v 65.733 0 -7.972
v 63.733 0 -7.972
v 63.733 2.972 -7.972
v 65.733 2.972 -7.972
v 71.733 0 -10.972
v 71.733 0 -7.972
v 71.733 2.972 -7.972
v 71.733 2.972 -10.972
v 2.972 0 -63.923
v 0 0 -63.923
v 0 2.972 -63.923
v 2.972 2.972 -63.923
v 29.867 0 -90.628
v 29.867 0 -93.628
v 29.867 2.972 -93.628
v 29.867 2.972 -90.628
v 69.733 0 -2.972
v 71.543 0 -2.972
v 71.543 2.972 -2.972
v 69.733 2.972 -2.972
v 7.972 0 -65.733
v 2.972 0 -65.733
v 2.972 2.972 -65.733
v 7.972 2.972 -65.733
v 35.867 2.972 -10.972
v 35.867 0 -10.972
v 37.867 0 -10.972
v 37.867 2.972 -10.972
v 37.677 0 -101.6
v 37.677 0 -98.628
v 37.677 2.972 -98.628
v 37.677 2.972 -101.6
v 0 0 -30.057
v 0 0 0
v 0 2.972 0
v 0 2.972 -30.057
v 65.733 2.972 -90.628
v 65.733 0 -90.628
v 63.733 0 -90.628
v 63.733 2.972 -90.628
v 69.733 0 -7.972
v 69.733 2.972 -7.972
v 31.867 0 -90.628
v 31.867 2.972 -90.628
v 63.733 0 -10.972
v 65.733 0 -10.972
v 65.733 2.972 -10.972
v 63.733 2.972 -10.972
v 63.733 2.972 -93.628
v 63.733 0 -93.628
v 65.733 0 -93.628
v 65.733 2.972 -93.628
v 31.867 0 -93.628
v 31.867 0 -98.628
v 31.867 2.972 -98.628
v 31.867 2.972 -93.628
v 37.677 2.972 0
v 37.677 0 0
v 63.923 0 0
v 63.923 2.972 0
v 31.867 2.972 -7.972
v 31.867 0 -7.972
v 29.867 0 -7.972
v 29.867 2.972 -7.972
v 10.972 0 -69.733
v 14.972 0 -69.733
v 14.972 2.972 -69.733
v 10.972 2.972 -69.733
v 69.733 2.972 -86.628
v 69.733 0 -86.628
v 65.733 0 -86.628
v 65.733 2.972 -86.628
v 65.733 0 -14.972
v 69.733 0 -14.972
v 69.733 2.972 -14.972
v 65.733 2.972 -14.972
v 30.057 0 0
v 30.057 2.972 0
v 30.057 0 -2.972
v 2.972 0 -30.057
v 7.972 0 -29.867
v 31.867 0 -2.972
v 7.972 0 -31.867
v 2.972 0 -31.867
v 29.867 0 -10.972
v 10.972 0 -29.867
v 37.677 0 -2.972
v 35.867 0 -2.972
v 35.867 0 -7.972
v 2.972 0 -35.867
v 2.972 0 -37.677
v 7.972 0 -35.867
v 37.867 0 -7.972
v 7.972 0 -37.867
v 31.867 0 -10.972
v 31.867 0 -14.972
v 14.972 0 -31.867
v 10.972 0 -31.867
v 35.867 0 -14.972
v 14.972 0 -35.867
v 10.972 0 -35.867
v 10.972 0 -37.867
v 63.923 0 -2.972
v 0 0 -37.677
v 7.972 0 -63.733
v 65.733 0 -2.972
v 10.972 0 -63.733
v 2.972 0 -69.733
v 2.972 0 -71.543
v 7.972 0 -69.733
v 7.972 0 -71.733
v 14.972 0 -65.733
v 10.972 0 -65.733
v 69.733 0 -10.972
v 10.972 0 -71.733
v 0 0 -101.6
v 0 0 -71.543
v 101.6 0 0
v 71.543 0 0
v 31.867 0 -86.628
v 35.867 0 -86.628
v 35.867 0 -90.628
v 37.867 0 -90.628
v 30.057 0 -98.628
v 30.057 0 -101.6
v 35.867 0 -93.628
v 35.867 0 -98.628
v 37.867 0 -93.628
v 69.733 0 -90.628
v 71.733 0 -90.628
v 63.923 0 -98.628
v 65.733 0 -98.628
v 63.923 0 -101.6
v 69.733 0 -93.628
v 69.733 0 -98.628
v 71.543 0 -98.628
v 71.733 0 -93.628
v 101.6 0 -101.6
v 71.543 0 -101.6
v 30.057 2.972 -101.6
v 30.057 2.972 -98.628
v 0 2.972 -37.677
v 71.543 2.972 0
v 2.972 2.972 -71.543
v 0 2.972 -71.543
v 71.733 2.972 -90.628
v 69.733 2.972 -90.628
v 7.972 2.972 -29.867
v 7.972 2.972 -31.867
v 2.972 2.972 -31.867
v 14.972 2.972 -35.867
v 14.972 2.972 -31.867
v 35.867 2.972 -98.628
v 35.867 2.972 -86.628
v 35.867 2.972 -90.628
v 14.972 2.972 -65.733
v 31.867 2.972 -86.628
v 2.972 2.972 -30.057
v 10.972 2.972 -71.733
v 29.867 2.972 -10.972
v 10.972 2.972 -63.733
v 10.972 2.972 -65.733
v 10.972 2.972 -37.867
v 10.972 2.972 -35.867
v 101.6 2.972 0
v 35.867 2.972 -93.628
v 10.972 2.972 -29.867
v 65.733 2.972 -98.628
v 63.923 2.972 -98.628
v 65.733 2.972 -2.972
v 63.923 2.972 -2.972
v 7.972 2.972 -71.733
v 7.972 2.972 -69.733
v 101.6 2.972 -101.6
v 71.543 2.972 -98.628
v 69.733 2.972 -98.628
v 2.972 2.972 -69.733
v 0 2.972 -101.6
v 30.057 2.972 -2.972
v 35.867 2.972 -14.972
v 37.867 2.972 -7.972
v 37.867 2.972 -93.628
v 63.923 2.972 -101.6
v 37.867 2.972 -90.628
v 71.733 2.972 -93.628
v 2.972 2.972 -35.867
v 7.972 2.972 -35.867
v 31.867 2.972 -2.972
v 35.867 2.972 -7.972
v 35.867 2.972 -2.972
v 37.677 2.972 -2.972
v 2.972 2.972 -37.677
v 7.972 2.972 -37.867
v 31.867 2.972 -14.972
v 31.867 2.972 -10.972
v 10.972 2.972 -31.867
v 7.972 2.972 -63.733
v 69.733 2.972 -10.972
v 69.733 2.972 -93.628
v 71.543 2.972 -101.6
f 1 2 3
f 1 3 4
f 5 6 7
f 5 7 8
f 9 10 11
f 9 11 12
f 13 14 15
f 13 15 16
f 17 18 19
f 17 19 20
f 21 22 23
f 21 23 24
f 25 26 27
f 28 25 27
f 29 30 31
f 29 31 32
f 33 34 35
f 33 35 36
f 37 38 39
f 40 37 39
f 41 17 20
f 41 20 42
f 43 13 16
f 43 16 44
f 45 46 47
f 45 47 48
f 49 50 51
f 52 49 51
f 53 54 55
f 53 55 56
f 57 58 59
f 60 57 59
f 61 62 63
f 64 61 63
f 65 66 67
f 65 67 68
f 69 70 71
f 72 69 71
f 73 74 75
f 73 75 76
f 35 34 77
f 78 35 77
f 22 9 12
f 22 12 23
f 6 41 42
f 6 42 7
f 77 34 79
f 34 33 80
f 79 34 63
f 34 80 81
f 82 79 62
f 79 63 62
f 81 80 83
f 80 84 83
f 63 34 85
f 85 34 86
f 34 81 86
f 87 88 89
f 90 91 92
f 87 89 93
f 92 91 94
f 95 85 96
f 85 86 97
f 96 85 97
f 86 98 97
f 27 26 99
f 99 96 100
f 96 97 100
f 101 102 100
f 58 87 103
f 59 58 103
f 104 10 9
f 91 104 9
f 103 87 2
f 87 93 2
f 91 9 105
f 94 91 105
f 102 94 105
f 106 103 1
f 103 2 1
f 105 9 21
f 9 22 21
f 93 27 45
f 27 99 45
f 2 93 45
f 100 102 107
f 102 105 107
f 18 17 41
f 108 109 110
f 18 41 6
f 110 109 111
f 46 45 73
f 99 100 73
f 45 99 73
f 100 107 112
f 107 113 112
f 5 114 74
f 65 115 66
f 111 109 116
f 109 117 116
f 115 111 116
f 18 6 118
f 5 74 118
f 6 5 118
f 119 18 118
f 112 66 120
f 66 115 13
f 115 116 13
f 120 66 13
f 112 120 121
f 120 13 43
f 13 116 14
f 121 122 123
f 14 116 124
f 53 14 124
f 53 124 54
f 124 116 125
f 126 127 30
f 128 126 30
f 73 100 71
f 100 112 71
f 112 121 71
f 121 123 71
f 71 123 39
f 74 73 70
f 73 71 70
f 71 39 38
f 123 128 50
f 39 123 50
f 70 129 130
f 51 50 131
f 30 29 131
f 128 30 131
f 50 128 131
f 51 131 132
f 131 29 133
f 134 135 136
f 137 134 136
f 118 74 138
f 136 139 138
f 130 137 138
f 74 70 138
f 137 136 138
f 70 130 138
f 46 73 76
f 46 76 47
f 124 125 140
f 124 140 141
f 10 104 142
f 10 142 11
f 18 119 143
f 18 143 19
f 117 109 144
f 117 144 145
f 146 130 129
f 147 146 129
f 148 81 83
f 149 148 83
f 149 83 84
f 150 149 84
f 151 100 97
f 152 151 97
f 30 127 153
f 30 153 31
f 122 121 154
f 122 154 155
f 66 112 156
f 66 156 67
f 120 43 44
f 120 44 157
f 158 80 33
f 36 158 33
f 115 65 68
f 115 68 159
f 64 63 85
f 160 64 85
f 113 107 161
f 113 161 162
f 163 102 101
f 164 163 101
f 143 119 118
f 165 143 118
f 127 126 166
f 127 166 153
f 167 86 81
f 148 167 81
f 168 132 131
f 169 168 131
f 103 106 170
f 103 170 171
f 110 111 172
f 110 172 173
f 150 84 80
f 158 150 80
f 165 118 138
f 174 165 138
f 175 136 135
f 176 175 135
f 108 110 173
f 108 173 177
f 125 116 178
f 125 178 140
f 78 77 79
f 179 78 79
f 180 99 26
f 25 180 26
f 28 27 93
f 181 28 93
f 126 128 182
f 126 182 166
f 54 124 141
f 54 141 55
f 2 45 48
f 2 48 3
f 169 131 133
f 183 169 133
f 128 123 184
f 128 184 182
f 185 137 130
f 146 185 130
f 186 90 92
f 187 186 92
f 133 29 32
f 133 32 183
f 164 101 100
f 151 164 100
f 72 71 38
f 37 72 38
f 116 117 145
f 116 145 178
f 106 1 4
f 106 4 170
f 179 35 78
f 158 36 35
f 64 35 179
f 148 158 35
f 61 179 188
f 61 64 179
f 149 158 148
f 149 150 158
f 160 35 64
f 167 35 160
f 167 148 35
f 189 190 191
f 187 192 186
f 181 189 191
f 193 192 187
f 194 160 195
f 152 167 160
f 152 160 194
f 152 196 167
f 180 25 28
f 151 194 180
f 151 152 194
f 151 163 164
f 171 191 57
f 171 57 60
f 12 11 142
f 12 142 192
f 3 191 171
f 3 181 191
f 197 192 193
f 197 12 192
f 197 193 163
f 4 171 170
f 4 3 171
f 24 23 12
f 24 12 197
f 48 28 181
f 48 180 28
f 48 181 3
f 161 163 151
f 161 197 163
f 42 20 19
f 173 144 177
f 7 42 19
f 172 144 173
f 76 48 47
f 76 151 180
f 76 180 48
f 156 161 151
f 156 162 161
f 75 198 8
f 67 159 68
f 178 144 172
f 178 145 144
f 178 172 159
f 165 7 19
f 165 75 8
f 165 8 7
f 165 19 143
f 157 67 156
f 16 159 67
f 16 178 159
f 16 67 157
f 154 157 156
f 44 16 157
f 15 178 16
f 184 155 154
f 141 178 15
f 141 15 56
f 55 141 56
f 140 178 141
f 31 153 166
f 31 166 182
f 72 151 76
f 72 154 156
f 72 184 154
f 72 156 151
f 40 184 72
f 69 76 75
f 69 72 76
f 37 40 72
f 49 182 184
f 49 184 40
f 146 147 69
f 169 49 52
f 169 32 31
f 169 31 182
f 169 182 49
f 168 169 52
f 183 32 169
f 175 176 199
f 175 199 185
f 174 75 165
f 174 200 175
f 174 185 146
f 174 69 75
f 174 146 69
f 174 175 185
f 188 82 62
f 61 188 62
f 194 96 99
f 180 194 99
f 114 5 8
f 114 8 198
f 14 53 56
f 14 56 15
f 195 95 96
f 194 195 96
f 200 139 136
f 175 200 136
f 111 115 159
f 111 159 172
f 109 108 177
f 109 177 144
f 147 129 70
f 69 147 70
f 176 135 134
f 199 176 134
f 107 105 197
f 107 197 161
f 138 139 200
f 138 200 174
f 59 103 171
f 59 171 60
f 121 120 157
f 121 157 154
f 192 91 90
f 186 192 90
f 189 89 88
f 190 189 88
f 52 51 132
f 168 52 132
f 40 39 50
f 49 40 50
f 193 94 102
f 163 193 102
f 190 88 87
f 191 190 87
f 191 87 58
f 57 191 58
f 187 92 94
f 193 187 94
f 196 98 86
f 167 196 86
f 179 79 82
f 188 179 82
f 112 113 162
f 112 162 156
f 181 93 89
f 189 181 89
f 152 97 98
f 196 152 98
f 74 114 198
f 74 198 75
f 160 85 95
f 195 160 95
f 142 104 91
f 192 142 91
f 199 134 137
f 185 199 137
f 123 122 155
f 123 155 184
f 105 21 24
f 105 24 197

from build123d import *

# Parameters (mm, degrees)
SKETCH_1_W            = 101.6
SKETCH_1_H            = 101.6
EXTRUDE_1_DEPTH       = 2.9718
CUT_EXTRUDE_1_DEPTH   = 144.714827333
MIRROR_2_COPY_1_DEPTH = 144.714827333
CUT_EXTRUDE_3_DEPTH   = 144.714827333


with BuildPart() as part:
    # 草图1 → 凸台-拉伸1 (new body)
    with BuildSketch(Plane(origin=(0, 0, 0), x_dir=(1, 0, 0), z_dir=(0, 1, 0))):
        with Locations((50.8, 50.8)):
            Rectangle(SKETCH_1_W, SKETCH_1_H)
    extrude(amount=EXTRUDE_1_DEPTH)

    # 草图1<3> → 切除-拉伸1 (cut, through all)
    with BuildSketch(Plane(origin=(0, 0, 0), x_dir=(1, 0, 0), z_dir=(0, 1, 0))):
        Polygon((37.676666667, 98.6282), (37.676666667, 101.6), (30.056666667, 101.6), (30.056666667, 98.6282), (31.866666667, 98.6282), (31.866666667, 93.6282), (29.866666667, 93.6282), (29.866666667, 90.6282), (31.866666667, 90.6282), (31.866666667, 86.6282), (35.866666667, 86.6282), (35.866666667, 90.6282), (37.866666667, 90.6282), (37.866666667, 93.6282), (35.866666667, 93.6282), (35.866666667, 98.6282), align=None)
    cut_extrude_1 = extrude(amount=CUT_EXTRUDE_1_DEPTH, mode=Mode.SUBTRACT)

    # 镜向1: 切除-拉伸1 across plane
    add(cut_extrude_1.mirror(Plane(origin=(0, 0, -50.8), x_dir=(1, 0, 0), z_dir=(0, 0, -1))), mode=Mode.SUBTRACT)

    # 镜向2: 切除-拉伸1 across plane
    add(cut_extrude_1.mirror(Plane(origin=(50.8, 0, 0), x_dir=(0, 0, 1), z_dir=(1, 0, 0))), mode=Mode.SUBTRACT)

    # 镜向2 copy 1 sketch → 镜向2 copy 1 (cut, through all)
    with BuildSketch(Plane(origin=(101.6, 0, -101.6), x_dir=(-1, 0, 0), z_dir=(0, 1, 0))):
        Polygon((37.676666667, 98.6282), (37.676666667, 101.6), (30.056666667, 101.6), (30.056666667, 98.6282), (31.866666667, 98.6282), (31.866666667, 93.6282), (29.866666667, 93.6282), (29.866666667, 90.6282), (31.866666667, 90.6282), (31.866666667, 86.6282), (35.866666667, 86.6282), (35.866666667, 90.6282), (37.866666667, 90.6282), (37.866666667, 93.6282), (35.866666667, 93.6282), (35.866666667, 98.6282), align=None)
    extrude(amount=MIRROR_2_COPY_1_DEPTH, mode=Mode.SUBTRACT)

    # 草图1<4> → 切除-拉伸3 (cut, through all)
    with BuildSketch(Plane(origin=(0, 0, 0), x_dir=(1, 0, 0), z_dir=(0, 1, 0))):
        Polygon((0, 71.543333333), (0, 63.923333333), (2.9718, 63.923333333), (2.9718, 65.733333333), (7.9718, 65.733333333), (7.9718, 63.733333333), (10.9718, 63.733333333), (10.9718, 65.733333333), (14.9718, 65.733333333), (14.9718, 69.733333333), (10.9718, 69.733333333), (10.9718, 71.733333333), (7.9718, 71.733333333), (7.9718, 69.733333333), (2.9718, 69.733333333), (2.9718, 71.543333333), align=None)
    cut_extrude_3 = extrude(amount=CUT_EXTRUDE_3_DEPTH, mode=Mode.SUBTRACT)

    # 镜向3: 切除-拉伸3 across plane
    add(cut_extrude_3.mirror(Plane(origin=(0, 0, -50.8), x_dir=(1, 0, 0), z_dir=(0, 0, -1))), mode=Mode.SUBTRACT)


solid = part.part
